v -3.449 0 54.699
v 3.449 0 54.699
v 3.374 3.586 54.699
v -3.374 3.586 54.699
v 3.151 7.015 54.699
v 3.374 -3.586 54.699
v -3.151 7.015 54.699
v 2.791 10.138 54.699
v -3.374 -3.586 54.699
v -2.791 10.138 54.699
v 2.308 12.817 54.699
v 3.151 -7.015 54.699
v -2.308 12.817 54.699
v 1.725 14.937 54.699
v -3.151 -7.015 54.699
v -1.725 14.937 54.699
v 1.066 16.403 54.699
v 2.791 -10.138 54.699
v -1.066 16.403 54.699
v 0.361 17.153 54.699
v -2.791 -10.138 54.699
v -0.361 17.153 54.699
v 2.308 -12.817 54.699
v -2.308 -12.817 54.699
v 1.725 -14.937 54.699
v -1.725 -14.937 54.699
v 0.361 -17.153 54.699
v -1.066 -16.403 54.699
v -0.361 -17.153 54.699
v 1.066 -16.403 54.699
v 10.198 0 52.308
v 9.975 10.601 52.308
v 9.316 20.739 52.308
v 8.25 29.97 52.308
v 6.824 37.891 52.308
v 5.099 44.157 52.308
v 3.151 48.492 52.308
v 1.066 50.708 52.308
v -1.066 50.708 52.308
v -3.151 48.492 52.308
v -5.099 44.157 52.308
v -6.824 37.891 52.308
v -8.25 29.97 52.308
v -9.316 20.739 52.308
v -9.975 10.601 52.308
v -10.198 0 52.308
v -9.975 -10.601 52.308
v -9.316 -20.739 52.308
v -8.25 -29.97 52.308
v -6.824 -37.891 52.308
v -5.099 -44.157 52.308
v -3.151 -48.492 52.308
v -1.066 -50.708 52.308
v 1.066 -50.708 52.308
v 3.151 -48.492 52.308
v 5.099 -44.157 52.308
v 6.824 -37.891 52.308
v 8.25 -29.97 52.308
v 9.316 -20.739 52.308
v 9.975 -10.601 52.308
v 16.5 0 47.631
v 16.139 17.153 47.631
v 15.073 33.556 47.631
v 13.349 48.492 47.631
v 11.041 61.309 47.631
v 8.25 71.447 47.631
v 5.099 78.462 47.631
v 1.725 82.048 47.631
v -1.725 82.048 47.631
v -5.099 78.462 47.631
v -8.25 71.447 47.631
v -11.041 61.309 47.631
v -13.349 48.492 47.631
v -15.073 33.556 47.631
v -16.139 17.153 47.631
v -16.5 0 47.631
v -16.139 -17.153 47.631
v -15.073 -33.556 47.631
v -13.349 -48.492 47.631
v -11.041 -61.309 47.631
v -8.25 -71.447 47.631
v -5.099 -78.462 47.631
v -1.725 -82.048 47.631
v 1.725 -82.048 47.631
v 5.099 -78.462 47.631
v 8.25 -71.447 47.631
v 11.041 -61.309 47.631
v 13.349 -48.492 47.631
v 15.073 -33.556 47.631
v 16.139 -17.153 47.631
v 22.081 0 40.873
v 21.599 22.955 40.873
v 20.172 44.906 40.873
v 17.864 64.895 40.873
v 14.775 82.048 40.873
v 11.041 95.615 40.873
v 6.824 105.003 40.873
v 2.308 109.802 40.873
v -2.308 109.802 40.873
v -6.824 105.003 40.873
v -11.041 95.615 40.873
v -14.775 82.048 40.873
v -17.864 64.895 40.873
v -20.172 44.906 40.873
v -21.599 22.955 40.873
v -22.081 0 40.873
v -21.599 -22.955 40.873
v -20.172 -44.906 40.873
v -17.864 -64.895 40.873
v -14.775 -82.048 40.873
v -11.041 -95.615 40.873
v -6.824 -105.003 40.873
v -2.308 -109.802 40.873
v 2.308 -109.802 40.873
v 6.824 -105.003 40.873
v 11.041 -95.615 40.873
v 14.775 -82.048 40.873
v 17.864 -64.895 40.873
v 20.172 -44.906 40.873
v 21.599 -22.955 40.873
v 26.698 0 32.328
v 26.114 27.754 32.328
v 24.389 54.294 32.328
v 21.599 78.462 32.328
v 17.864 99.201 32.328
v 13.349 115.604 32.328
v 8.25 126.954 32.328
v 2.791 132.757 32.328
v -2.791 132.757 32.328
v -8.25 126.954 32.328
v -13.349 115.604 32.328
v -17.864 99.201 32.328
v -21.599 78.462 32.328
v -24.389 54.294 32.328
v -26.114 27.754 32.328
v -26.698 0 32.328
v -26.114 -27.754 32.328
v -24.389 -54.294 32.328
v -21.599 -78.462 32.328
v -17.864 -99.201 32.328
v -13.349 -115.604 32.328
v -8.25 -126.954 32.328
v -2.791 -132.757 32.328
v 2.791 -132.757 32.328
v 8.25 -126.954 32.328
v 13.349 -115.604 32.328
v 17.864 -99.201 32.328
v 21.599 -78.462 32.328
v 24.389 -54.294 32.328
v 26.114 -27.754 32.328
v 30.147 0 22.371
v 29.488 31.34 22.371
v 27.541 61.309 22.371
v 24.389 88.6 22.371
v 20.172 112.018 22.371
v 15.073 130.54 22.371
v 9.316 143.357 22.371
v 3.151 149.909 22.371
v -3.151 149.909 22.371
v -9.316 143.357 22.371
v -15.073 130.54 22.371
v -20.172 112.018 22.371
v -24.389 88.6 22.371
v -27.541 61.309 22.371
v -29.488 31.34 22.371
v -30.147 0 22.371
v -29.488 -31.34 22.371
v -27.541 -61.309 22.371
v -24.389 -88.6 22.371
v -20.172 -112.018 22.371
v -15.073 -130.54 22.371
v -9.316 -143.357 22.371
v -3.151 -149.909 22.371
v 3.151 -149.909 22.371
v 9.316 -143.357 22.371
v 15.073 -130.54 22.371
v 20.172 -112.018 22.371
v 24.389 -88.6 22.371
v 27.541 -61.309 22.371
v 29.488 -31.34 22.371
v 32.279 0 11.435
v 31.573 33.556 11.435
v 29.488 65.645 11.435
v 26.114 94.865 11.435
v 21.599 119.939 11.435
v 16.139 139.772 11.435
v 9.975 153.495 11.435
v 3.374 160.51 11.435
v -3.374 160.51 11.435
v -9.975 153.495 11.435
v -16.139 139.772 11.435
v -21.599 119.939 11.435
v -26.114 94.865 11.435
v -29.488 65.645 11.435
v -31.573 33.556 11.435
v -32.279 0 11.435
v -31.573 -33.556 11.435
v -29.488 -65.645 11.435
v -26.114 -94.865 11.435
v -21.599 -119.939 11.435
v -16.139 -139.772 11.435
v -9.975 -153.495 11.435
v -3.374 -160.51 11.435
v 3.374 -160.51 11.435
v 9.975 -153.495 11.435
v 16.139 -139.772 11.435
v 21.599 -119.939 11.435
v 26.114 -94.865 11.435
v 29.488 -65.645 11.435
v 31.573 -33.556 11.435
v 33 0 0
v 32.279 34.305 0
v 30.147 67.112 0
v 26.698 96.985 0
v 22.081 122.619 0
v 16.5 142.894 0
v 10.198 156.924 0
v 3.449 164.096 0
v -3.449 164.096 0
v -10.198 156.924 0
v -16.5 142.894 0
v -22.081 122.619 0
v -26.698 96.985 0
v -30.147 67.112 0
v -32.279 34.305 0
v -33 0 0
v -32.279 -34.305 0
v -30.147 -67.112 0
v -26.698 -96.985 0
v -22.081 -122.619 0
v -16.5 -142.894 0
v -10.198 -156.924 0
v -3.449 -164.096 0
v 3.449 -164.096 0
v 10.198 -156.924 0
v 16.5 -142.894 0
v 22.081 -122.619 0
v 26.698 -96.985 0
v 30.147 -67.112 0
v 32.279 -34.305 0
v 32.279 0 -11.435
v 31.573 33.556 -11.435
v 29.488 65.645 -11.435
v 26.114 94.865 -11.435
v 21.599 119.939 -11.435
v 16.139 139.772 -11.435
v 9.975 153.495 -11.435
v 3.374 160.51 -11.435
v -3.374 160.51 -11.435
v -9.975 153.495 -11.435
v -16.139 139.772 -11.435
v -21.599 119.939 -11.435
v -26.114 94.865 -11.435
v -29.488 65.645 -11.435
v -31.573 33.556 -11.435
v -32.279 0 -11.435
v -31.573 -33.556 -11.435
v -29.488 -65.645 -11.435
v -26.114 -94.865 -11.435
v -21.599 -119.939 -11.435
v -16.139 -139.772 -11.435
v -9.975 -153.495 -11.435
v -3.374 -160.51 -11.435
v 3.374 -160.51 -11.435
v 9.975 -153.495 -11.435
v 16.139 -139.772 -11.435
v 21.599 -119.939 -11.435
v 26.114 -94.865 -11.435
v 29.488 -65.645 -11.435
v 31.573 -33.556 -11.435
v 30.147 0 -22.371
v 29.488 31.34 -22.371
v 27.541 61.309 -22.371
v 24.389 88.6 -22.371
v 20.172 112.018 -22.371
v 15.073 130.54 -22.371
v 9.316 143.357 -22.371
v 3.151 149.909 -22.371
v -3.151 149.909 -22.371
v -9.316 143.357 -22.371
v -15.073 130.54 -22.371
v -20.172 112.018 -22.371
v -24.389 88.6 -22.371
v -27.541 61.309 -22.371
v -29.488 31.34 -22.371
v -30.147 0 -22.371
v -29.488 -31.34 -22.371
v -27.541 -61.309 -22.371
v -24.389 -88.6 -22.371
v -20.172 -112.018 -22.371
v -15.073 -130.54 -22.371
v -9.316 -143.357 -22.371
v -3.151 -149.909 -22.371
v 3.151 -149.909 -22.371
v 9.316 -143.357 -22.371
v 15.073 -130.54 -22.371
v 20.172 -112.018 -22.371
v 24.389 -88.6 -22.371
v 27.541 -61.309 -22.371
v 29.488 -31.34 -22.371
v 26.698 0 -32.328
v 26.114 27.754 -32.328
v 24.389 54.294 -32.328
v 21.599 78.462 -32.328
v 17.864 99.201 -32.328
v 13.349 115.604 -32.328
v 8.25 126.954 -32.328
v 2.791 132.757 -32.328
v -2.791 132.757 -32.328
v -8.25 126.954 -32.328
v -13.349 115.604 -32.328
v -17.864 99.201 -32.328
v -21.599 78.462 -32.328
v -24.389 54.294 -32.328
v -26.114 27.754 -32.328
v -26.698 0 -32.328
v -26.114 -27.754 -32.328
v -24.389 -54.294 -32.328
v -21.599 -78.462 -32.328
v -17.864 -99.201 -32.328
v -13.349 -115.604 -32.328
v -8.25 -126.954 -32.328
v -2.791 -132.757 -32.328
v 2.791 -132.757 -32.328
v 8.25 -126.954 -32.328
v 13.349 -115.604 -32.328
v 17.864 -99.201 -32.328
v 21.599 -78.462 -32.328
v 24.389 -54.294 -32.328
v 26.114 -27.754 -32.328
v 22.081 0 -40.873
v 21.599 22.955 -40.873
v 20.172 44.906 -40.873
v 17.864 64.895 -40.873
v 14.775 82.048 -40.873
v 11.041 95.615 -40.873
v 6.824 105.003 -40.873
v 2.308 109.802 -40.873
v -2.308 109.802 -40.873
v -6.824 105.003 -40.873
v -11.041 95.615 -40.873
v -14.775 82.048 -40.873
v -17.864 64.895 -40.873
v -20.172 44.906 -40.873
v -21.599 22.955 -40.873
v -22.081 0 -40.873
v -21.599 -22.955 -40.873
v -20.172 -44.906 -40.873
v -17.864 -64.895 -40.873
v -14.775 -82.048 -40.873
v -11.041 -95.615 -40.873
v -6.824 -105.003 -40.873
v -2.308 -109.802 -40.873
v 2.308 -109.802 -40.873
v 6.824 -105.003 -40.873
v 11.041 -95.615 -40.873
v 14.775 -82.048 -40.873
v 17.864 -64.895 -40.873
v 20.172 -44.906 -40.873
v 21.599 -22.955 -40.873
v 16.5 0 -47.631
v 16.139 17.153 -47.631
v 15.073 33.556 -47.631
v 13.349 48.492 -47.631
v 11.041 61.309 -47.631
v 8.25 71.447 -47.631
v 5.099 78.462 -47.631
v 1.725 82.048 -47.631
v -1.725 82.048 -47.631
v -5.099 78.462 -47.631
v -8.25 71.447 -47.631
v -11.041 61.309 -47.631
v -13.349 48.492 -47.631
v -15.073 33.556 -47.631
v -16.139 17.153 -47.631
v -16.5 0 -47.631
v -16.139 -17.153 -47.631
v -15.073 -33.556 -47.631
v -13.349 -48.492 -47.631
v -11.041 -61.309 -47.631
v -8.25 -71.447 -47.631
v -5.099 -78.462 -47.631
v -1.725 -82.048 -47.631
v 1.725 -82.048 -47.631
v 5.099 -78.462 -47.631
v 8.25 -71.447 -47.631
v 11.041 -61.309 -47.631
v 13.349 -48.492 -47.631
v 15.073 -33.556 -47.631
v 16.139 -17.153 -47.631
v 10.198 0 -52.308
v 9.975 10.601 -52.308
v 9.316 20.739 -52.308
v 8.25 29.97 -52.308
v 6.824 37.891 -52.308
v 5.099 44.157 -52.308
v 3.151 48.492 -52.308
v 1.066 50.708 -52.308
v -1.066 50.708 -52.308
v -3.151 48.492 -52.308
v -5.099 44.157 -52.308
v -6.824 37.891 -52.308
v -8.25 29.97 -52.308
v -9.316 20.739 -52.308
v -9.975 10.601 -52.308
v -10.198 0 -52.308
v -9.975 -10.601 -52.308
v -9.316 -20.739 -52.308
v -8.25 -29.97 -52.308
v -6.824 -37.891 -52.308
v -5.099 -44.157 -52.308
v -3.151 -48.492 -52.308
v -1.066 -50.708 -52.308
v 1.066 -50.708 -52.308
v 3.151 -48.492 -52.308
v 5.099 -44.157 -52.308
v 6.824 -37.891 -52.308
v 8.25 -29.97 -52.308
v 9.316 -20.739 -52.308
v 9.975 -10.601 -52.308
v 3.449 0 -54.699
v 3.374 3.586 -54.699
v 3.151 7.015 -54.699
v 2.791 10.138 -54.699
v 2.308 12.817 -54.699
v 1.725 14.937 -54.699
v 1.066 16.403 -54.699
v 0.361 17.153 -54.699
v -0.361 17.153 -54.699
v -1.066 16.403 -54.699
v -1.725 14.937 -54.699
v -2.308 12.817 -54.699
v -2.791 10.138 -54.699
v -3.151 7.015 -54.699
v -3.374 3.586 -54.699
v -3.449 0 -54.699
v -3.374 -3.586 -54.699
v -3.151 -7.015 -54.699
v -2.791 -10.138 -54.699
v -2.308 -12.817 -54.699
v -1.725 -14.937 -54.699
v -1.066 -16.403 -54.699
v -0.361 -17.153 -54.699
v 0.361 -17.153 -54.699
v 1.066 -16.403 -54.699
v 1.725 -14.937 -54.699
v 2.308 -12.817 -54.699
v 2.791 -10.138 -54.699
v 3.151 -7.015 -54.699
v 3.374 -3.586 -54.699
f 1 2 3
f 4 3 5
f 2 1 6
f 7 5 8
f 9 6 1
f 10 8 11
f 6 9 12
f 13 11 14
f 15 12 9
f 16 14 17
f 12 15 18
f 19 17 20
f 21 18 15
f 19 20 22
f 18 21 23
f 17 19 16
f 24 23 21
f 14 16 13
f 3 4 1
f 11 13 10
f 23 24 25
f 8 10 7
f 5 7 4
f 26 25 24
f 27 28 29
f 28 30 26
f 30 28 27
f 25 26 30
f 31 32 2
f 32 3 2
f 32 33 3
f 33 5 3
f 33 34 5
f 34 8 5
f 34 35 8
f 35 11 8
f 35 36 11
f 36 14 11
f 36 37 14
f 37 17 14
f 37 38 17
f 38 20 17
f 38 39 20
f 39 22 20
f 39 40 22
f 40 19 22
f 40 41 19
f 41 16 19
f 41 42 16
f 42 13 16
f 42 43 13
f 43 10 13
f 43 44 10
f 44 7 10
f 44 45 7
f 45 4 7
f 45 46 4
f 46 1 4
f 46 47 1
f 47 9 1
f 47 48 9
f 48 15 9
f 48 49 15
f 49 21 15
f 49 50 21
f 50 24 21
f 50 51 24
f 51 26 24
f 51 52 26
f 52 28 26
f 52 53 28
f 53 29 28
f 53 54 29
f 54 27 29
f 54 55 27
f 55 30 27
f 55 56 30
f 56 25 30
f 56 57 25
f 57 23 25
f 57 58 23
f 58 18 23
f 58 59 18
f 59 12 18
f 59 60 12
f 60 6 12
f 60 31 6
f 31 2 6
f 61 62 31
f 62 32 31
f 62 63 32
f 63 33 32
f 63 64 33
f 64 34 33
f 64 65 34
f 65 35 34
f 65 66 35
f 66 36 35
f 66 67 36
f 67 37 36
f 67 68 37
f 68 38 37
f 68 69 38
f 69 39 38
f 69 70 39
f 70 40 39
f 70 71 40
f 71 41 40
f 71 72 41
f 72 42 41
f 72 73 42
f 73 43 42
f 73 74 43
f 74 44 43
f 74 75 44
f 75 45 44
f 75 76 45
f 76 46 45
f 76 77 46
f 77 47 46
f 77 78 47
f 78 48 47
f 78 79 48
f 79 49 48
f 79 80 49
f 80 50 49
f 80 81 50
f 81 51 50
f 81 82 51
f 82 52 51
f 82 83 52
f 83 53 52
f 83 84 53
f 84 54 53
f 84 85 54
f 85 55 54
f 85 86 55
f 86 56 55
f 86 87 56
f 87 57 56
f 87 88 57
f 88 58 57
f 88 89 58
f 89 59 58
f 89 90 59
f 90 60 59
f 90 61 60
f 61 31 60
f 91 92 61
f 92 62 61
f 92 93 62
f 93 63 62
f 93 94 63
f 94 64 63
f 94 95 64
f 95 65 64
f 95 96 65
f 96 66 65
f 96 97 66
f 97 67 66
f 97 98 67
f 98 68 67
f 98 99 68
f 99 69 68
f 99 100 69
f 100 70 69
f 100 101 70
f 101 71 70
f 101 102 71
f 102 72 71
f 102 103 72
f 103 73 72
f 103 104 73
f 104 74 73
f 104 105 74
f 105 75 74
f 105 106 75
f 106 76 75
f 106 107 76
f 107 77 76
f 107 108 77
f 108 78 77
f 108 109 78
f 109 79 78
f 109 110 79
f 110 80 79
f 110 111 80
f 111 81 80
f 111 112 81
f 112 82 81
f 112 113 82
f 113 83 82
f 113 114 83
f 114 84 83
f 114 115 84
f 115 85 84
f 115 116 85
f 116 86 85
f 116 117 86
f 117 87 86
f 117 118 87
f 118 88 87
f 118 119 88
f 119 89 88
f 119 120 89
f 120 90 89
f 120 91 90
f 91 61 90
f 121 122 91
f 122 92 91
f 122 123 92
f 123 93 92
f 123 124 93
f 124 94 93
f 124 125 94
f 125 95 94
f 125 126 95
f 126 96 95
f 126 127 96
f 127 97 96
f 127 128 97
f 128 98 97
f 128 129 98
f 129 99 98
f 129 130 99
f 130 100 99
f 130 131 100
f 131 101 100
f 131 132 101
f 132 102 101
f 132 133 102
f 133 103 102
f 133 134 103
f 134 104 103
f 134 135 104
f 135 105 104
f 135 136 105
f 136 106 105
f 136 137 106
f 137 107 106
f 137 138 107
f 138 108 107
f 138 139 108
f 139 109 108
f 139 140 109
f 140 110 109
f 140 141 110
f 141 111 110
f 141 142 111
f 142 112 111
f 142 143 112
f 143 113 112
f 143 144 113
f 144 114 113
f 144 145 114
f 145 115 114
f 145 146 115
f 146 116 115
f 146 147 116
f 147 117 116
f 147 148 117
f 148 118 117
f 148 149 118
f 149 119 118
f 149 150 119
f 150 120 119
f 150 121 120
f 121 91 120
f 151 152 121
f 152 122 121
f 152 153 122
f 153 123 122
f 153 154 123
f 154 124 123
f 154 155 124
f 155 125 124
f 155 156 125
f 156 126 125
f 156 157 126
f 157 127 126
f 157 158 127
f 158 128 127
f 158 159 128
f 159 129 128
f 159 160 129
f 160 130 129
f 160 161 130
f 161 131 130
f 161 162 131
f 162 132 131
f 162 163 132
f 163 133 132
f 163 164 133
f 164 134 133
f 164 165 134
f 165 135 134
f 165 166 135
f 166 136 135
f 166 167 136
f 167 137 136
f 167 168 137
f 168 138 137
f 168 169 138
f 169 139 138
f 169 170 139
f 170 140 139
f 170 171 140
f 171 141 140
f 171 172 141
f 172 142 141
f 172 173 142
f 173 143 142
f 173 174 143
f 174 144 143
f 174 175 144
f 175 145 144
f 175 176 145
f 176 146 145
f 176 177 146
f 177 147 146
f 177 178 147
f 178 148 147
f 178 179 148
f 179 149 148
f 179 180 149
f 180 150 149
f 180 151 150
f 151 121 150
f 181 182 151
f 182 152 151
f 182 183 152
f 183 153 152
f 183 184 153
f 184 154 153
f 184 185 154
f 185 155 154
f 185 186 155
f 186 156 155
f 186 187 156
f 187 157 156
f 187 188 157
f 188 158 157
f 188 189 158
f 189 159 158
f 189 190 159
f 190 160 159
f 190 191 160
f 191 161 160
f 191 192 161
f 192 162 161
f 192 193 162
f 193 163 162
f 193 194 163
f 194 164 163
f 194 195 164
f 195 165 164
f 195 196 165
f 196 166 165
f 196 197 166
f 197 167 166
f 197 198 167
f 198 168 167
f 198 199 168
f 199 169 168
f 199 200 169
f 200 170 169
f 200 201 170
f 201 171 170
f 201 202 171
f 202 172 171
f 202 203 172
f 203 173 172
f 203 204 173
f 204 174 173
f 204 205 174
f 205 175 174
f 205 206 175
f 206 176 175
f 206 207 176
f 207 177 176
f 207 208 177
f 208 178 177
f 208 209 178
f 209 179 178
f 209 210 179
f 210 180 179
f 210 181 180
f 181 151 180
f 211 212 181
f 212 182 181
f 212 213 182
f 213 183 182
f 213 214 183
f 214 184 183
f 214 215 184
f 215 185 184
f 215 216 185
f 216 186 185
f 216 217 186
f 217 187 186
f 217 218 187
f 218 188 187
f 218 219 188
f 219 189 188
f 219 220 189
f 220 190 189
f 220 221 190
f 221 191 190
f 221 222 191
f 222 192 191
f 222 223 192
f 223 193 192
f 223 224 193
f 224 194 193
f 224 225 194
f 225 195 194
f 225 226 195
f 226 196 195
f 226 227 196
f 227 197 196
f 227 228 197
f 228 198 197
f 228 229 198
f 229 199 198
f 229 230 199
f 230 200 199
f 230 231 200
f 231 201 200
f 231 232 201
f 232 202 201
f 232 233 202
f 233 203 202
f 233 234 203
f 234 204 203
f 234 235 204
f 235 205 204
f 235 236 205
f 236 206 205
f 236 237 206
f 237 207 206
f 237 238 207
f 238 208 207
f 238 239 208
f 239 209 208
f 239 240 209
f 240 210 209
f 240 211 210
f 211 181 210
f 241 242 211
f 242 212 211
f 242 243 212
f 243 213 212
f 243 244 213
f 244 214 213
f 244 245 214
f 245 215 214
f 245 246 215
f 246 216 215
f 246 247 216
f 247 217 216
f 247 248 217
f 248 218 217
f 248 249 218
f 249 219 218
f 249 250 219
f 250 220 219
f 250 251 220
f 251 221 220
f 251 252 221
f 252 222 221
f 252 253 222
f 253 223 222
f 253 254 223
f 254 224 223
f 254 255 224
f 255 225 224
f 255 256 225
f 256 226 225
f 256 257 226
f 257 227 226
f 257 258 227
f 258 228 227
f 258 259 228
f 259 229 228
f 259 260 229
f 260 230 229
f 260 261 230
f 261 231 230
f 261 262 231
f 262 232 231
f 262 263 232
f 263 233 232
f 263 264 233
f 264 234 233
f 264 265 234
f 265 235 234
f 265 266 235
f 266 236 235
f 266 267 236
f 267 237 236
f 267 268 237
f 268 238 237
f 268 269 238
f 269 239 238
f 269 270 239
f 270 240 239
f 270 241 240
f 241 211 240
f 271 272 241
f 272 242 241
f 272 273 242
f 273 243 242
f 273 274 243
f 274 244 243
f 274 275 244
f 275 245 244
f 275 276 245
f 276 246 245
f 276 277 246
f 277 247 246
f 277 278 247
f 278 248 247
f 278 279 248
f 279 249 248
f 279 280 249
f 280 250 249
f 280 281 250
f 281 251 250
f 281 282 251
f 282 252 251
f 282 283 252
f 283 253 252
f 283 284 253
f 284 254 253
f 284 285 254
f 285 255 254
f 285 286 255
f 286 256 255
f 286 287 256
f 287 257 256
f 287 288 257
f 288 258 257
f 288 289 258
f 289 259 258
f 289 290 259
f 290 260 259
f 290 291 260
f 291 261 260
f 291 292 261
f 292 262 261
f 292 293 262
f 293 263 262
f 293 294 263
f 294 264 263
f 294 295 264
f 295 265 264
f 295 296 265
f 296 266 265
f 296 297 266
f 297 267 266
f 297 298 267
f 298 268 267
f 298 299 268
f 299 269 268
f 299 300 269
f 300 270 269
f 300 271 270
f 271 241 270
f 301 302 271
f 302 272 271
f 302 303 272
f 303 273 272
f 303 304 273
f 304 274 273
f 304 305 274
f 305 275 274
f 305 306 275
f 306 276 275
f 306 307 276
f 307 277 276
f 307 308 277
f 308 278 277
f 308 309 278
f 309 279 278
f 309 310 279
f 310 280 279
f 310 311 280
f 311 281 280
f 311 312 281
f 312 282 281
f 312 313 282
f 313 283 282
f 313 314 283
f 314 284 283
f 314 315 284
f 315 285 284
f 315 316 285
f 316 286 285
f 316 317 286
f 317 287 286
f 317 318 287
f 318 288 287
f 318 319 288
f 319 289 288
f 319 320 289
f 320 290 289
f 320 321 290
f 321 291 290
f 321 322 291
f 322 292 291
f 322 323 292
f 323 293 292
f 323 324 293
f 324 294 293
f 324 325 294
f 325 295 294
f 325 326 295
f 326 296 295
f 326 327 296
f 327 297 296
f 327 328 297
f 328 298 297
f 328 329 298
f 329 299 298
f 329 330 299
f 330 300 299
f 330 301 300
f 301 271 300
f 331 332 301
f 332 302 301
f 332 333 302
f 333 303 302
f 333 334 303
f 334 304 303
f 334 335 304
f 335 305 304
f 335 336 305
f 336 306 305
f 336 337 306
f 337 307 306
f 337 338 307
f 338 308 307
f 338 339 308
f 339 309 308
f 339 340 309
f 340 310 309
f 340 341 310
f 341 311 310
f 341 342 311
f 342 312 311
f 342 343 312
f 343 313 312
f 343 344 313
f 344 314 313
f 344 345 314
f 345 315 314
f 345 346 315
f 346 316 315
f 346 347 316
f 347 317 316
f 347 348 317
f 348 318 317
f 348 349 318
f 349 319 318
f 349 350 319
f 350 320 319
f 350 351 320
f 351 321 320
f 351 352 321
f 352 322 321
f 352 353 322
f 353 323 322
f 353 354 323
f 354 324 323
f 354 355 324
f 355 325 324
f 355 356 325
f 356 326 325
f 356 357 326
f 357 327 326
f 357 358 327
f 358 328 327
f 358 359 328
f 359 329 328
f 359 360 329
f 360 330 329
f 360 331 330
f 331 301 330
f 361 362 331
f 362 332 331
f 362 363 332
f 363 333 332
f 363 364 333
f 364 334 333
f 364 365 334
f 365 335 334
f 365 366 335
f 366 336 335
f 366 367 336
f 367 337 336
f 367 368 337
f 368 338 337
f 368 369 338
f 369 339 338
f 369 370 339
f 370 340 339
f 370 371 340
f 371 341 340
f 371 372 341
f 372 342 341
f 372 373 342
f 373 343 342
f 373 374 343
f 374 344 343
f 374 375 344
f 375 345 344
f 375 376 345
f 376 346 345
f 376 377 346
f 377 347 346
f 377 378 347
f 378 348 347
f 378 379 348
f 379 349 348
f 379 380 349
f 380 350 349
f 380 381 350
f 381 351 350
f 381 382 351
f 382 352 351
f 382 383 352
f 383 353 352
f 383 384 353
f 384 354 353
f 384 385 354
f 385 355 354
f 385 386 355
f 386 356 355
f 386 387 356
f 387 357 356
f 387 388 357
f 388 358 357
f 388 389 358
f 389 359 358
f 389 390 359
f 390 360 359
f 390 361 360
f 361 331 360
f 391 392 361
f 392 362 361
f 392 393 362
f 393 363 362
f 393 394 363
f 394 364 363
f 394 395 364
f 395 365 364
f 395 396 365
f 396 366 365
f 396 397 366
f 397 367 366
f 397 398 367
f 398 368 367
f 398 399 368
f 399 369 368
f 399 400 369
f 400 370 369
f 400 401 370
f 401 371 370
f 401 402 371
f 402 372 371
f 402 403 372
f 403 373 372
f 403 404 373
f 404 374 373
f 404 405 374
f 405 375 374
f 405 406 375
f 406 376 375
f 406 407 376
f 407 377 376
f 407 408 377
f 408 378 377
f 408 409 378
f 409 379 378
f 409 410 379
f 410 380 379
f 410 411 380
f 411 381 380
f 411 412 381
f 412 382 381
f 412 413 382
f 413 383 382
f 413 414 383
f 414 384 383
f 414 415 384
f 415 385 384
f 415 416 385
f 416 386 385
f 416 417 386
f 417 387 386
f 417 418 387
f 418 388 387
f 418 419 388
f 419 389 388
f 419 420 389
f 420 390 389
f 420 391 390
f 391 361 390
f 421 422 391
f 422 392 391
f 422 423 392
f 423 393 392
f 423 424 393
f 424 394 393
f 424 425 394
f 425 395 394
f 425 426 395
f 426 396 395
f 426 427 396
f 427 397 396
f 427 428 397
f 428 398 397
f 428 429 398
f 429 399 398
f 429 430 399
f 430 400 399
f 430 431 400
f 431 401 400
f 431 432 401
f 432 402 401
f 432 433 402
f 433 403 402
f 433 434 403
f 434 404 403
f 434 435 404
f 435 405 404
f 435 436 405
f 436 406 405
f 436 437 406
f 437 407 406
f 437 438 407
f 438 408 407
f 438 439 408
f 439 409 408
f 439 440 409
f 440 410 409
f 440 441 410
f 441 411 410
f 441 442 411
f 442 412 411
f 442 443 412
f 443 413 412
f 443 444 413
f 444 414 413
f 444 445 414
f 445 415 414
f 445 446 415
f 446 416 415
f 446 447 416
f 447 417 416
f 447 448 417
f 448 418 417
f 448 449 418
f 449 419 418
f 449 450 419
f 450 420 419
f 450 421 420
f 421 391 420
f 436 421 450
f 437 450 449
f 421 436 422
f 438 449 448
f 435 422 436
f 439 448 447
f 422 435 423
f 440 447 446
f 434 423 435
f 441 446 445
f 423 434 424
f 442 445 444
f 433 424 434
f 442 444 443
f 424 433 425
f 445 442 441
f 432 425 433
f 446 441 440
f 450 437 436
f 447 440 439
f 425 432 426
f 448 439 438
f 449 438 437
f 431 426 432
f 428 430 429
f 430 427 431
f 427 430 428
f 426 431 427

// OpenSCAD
// Generated by SolidPython 1.0.1 on 2020-07-29 00:46:45


scale(v = [3, 15, 5]) {
	sphere(r = 11);
}
/***********************************************
*********      SolidPython code:      **********
************************************************
 
# import packages: SolidPython
from solid import *
from solid.utils import *
from itertools import chain, combinations, permutations


class Resize:

    def __init__(self, scad_file):
        self.scad_file = scad_file
        #self.scad_file = import_scad(scad_file)
        # cone/cylinder param:
        self.r1 = 0
        self.r2 = 0
        self.h = 0
        # rectangular prism param:
        self.w = 0
        self.l = 0
        # ellipse param:
        self.r = 0

    # import OpenScad code (file name corresponds to shape)


    # classify shape + parameters
    def assign(self, param1, param2, param3):
        if self.scad_file == 'cone.scad':
            self.r1 = param1
            self.r2 = param2
            self.h = param3
        elif self.scad_file == 'cylinder.scad':
            self.r1 = param1
            self.r2 = param2
            self.h = param3
        elif self.scad_file == 'rectangularPrism.scad':
            self.h = param1
            self.l = param2
            self.w = param3
        else:
            self.r = param1
            self.h = param2

    # resize parameters
    def iterate(self):
        x = range(3, 20, 2)
        i = 1
        if self.scad_file == 'cone.scad':
            tempList = list(permutations(x, 2))
            for temp in tempList:
                param1 = temp[0]
                param2 = temp[1]
                filepath = 'produced_scad_files/' + 'cone' + str(param1) + '_' + str(param2) + '_' + '.scad'
                scad_render_to_file(cylinder(h=param1, r1=param2, r2=0), filepath)

        elif self.scad_file == 'cylinder.scad':
            tempList = list(permutations(x, 3))
            for temp in tempList:
                param1 = temp[0]
                param2 = temp[1]
                filepath = 'produced_scad_files/' + 'cylinder' + str(param1) + '_' + str(param2) + '_' + '.scad'
                scad_render_to_file(cylinder(h=param1, r1=param2, r2=param2), filepath)

        elif self.scad_file == 'rectangularPrism.scad':
            tempList = list(permutations(x, 3))
            for temp in tempList:
                param1 = temp[0]
                param2 = temp[1]
                param3 = temp[2]
                filepath = 'produced_scad_files/' + 'rectangularPrism' + str(param1) + '_' + str(param2) + '_' + str(
                    param3) + '.scad'
                scad_render_to_file(cube(size=(param1, param2, param3)), filepath)

        elif self.scad_file == 'ellipse.scad':
            tempList = list(permutations(x, 4))
            for temp in tempList:
                param1 = temp[0]
                param2 = temp[1]
                param3 = temp[2]
                param4 = temp[3]
                filepath = 'produced_scad_files/' + 'ellipse' + str(param1) + '_' + str(param2) + '_' + str(param3) + '_' + str(param4) + '.scad'
                scad_render_to_file(scale([param1, param2, param3])(sphere(r=param4)), filepath)

    def render_to_scadfile(self):
        scad_render_to_file(scad, 'example.scad') 
 
************************************************/
